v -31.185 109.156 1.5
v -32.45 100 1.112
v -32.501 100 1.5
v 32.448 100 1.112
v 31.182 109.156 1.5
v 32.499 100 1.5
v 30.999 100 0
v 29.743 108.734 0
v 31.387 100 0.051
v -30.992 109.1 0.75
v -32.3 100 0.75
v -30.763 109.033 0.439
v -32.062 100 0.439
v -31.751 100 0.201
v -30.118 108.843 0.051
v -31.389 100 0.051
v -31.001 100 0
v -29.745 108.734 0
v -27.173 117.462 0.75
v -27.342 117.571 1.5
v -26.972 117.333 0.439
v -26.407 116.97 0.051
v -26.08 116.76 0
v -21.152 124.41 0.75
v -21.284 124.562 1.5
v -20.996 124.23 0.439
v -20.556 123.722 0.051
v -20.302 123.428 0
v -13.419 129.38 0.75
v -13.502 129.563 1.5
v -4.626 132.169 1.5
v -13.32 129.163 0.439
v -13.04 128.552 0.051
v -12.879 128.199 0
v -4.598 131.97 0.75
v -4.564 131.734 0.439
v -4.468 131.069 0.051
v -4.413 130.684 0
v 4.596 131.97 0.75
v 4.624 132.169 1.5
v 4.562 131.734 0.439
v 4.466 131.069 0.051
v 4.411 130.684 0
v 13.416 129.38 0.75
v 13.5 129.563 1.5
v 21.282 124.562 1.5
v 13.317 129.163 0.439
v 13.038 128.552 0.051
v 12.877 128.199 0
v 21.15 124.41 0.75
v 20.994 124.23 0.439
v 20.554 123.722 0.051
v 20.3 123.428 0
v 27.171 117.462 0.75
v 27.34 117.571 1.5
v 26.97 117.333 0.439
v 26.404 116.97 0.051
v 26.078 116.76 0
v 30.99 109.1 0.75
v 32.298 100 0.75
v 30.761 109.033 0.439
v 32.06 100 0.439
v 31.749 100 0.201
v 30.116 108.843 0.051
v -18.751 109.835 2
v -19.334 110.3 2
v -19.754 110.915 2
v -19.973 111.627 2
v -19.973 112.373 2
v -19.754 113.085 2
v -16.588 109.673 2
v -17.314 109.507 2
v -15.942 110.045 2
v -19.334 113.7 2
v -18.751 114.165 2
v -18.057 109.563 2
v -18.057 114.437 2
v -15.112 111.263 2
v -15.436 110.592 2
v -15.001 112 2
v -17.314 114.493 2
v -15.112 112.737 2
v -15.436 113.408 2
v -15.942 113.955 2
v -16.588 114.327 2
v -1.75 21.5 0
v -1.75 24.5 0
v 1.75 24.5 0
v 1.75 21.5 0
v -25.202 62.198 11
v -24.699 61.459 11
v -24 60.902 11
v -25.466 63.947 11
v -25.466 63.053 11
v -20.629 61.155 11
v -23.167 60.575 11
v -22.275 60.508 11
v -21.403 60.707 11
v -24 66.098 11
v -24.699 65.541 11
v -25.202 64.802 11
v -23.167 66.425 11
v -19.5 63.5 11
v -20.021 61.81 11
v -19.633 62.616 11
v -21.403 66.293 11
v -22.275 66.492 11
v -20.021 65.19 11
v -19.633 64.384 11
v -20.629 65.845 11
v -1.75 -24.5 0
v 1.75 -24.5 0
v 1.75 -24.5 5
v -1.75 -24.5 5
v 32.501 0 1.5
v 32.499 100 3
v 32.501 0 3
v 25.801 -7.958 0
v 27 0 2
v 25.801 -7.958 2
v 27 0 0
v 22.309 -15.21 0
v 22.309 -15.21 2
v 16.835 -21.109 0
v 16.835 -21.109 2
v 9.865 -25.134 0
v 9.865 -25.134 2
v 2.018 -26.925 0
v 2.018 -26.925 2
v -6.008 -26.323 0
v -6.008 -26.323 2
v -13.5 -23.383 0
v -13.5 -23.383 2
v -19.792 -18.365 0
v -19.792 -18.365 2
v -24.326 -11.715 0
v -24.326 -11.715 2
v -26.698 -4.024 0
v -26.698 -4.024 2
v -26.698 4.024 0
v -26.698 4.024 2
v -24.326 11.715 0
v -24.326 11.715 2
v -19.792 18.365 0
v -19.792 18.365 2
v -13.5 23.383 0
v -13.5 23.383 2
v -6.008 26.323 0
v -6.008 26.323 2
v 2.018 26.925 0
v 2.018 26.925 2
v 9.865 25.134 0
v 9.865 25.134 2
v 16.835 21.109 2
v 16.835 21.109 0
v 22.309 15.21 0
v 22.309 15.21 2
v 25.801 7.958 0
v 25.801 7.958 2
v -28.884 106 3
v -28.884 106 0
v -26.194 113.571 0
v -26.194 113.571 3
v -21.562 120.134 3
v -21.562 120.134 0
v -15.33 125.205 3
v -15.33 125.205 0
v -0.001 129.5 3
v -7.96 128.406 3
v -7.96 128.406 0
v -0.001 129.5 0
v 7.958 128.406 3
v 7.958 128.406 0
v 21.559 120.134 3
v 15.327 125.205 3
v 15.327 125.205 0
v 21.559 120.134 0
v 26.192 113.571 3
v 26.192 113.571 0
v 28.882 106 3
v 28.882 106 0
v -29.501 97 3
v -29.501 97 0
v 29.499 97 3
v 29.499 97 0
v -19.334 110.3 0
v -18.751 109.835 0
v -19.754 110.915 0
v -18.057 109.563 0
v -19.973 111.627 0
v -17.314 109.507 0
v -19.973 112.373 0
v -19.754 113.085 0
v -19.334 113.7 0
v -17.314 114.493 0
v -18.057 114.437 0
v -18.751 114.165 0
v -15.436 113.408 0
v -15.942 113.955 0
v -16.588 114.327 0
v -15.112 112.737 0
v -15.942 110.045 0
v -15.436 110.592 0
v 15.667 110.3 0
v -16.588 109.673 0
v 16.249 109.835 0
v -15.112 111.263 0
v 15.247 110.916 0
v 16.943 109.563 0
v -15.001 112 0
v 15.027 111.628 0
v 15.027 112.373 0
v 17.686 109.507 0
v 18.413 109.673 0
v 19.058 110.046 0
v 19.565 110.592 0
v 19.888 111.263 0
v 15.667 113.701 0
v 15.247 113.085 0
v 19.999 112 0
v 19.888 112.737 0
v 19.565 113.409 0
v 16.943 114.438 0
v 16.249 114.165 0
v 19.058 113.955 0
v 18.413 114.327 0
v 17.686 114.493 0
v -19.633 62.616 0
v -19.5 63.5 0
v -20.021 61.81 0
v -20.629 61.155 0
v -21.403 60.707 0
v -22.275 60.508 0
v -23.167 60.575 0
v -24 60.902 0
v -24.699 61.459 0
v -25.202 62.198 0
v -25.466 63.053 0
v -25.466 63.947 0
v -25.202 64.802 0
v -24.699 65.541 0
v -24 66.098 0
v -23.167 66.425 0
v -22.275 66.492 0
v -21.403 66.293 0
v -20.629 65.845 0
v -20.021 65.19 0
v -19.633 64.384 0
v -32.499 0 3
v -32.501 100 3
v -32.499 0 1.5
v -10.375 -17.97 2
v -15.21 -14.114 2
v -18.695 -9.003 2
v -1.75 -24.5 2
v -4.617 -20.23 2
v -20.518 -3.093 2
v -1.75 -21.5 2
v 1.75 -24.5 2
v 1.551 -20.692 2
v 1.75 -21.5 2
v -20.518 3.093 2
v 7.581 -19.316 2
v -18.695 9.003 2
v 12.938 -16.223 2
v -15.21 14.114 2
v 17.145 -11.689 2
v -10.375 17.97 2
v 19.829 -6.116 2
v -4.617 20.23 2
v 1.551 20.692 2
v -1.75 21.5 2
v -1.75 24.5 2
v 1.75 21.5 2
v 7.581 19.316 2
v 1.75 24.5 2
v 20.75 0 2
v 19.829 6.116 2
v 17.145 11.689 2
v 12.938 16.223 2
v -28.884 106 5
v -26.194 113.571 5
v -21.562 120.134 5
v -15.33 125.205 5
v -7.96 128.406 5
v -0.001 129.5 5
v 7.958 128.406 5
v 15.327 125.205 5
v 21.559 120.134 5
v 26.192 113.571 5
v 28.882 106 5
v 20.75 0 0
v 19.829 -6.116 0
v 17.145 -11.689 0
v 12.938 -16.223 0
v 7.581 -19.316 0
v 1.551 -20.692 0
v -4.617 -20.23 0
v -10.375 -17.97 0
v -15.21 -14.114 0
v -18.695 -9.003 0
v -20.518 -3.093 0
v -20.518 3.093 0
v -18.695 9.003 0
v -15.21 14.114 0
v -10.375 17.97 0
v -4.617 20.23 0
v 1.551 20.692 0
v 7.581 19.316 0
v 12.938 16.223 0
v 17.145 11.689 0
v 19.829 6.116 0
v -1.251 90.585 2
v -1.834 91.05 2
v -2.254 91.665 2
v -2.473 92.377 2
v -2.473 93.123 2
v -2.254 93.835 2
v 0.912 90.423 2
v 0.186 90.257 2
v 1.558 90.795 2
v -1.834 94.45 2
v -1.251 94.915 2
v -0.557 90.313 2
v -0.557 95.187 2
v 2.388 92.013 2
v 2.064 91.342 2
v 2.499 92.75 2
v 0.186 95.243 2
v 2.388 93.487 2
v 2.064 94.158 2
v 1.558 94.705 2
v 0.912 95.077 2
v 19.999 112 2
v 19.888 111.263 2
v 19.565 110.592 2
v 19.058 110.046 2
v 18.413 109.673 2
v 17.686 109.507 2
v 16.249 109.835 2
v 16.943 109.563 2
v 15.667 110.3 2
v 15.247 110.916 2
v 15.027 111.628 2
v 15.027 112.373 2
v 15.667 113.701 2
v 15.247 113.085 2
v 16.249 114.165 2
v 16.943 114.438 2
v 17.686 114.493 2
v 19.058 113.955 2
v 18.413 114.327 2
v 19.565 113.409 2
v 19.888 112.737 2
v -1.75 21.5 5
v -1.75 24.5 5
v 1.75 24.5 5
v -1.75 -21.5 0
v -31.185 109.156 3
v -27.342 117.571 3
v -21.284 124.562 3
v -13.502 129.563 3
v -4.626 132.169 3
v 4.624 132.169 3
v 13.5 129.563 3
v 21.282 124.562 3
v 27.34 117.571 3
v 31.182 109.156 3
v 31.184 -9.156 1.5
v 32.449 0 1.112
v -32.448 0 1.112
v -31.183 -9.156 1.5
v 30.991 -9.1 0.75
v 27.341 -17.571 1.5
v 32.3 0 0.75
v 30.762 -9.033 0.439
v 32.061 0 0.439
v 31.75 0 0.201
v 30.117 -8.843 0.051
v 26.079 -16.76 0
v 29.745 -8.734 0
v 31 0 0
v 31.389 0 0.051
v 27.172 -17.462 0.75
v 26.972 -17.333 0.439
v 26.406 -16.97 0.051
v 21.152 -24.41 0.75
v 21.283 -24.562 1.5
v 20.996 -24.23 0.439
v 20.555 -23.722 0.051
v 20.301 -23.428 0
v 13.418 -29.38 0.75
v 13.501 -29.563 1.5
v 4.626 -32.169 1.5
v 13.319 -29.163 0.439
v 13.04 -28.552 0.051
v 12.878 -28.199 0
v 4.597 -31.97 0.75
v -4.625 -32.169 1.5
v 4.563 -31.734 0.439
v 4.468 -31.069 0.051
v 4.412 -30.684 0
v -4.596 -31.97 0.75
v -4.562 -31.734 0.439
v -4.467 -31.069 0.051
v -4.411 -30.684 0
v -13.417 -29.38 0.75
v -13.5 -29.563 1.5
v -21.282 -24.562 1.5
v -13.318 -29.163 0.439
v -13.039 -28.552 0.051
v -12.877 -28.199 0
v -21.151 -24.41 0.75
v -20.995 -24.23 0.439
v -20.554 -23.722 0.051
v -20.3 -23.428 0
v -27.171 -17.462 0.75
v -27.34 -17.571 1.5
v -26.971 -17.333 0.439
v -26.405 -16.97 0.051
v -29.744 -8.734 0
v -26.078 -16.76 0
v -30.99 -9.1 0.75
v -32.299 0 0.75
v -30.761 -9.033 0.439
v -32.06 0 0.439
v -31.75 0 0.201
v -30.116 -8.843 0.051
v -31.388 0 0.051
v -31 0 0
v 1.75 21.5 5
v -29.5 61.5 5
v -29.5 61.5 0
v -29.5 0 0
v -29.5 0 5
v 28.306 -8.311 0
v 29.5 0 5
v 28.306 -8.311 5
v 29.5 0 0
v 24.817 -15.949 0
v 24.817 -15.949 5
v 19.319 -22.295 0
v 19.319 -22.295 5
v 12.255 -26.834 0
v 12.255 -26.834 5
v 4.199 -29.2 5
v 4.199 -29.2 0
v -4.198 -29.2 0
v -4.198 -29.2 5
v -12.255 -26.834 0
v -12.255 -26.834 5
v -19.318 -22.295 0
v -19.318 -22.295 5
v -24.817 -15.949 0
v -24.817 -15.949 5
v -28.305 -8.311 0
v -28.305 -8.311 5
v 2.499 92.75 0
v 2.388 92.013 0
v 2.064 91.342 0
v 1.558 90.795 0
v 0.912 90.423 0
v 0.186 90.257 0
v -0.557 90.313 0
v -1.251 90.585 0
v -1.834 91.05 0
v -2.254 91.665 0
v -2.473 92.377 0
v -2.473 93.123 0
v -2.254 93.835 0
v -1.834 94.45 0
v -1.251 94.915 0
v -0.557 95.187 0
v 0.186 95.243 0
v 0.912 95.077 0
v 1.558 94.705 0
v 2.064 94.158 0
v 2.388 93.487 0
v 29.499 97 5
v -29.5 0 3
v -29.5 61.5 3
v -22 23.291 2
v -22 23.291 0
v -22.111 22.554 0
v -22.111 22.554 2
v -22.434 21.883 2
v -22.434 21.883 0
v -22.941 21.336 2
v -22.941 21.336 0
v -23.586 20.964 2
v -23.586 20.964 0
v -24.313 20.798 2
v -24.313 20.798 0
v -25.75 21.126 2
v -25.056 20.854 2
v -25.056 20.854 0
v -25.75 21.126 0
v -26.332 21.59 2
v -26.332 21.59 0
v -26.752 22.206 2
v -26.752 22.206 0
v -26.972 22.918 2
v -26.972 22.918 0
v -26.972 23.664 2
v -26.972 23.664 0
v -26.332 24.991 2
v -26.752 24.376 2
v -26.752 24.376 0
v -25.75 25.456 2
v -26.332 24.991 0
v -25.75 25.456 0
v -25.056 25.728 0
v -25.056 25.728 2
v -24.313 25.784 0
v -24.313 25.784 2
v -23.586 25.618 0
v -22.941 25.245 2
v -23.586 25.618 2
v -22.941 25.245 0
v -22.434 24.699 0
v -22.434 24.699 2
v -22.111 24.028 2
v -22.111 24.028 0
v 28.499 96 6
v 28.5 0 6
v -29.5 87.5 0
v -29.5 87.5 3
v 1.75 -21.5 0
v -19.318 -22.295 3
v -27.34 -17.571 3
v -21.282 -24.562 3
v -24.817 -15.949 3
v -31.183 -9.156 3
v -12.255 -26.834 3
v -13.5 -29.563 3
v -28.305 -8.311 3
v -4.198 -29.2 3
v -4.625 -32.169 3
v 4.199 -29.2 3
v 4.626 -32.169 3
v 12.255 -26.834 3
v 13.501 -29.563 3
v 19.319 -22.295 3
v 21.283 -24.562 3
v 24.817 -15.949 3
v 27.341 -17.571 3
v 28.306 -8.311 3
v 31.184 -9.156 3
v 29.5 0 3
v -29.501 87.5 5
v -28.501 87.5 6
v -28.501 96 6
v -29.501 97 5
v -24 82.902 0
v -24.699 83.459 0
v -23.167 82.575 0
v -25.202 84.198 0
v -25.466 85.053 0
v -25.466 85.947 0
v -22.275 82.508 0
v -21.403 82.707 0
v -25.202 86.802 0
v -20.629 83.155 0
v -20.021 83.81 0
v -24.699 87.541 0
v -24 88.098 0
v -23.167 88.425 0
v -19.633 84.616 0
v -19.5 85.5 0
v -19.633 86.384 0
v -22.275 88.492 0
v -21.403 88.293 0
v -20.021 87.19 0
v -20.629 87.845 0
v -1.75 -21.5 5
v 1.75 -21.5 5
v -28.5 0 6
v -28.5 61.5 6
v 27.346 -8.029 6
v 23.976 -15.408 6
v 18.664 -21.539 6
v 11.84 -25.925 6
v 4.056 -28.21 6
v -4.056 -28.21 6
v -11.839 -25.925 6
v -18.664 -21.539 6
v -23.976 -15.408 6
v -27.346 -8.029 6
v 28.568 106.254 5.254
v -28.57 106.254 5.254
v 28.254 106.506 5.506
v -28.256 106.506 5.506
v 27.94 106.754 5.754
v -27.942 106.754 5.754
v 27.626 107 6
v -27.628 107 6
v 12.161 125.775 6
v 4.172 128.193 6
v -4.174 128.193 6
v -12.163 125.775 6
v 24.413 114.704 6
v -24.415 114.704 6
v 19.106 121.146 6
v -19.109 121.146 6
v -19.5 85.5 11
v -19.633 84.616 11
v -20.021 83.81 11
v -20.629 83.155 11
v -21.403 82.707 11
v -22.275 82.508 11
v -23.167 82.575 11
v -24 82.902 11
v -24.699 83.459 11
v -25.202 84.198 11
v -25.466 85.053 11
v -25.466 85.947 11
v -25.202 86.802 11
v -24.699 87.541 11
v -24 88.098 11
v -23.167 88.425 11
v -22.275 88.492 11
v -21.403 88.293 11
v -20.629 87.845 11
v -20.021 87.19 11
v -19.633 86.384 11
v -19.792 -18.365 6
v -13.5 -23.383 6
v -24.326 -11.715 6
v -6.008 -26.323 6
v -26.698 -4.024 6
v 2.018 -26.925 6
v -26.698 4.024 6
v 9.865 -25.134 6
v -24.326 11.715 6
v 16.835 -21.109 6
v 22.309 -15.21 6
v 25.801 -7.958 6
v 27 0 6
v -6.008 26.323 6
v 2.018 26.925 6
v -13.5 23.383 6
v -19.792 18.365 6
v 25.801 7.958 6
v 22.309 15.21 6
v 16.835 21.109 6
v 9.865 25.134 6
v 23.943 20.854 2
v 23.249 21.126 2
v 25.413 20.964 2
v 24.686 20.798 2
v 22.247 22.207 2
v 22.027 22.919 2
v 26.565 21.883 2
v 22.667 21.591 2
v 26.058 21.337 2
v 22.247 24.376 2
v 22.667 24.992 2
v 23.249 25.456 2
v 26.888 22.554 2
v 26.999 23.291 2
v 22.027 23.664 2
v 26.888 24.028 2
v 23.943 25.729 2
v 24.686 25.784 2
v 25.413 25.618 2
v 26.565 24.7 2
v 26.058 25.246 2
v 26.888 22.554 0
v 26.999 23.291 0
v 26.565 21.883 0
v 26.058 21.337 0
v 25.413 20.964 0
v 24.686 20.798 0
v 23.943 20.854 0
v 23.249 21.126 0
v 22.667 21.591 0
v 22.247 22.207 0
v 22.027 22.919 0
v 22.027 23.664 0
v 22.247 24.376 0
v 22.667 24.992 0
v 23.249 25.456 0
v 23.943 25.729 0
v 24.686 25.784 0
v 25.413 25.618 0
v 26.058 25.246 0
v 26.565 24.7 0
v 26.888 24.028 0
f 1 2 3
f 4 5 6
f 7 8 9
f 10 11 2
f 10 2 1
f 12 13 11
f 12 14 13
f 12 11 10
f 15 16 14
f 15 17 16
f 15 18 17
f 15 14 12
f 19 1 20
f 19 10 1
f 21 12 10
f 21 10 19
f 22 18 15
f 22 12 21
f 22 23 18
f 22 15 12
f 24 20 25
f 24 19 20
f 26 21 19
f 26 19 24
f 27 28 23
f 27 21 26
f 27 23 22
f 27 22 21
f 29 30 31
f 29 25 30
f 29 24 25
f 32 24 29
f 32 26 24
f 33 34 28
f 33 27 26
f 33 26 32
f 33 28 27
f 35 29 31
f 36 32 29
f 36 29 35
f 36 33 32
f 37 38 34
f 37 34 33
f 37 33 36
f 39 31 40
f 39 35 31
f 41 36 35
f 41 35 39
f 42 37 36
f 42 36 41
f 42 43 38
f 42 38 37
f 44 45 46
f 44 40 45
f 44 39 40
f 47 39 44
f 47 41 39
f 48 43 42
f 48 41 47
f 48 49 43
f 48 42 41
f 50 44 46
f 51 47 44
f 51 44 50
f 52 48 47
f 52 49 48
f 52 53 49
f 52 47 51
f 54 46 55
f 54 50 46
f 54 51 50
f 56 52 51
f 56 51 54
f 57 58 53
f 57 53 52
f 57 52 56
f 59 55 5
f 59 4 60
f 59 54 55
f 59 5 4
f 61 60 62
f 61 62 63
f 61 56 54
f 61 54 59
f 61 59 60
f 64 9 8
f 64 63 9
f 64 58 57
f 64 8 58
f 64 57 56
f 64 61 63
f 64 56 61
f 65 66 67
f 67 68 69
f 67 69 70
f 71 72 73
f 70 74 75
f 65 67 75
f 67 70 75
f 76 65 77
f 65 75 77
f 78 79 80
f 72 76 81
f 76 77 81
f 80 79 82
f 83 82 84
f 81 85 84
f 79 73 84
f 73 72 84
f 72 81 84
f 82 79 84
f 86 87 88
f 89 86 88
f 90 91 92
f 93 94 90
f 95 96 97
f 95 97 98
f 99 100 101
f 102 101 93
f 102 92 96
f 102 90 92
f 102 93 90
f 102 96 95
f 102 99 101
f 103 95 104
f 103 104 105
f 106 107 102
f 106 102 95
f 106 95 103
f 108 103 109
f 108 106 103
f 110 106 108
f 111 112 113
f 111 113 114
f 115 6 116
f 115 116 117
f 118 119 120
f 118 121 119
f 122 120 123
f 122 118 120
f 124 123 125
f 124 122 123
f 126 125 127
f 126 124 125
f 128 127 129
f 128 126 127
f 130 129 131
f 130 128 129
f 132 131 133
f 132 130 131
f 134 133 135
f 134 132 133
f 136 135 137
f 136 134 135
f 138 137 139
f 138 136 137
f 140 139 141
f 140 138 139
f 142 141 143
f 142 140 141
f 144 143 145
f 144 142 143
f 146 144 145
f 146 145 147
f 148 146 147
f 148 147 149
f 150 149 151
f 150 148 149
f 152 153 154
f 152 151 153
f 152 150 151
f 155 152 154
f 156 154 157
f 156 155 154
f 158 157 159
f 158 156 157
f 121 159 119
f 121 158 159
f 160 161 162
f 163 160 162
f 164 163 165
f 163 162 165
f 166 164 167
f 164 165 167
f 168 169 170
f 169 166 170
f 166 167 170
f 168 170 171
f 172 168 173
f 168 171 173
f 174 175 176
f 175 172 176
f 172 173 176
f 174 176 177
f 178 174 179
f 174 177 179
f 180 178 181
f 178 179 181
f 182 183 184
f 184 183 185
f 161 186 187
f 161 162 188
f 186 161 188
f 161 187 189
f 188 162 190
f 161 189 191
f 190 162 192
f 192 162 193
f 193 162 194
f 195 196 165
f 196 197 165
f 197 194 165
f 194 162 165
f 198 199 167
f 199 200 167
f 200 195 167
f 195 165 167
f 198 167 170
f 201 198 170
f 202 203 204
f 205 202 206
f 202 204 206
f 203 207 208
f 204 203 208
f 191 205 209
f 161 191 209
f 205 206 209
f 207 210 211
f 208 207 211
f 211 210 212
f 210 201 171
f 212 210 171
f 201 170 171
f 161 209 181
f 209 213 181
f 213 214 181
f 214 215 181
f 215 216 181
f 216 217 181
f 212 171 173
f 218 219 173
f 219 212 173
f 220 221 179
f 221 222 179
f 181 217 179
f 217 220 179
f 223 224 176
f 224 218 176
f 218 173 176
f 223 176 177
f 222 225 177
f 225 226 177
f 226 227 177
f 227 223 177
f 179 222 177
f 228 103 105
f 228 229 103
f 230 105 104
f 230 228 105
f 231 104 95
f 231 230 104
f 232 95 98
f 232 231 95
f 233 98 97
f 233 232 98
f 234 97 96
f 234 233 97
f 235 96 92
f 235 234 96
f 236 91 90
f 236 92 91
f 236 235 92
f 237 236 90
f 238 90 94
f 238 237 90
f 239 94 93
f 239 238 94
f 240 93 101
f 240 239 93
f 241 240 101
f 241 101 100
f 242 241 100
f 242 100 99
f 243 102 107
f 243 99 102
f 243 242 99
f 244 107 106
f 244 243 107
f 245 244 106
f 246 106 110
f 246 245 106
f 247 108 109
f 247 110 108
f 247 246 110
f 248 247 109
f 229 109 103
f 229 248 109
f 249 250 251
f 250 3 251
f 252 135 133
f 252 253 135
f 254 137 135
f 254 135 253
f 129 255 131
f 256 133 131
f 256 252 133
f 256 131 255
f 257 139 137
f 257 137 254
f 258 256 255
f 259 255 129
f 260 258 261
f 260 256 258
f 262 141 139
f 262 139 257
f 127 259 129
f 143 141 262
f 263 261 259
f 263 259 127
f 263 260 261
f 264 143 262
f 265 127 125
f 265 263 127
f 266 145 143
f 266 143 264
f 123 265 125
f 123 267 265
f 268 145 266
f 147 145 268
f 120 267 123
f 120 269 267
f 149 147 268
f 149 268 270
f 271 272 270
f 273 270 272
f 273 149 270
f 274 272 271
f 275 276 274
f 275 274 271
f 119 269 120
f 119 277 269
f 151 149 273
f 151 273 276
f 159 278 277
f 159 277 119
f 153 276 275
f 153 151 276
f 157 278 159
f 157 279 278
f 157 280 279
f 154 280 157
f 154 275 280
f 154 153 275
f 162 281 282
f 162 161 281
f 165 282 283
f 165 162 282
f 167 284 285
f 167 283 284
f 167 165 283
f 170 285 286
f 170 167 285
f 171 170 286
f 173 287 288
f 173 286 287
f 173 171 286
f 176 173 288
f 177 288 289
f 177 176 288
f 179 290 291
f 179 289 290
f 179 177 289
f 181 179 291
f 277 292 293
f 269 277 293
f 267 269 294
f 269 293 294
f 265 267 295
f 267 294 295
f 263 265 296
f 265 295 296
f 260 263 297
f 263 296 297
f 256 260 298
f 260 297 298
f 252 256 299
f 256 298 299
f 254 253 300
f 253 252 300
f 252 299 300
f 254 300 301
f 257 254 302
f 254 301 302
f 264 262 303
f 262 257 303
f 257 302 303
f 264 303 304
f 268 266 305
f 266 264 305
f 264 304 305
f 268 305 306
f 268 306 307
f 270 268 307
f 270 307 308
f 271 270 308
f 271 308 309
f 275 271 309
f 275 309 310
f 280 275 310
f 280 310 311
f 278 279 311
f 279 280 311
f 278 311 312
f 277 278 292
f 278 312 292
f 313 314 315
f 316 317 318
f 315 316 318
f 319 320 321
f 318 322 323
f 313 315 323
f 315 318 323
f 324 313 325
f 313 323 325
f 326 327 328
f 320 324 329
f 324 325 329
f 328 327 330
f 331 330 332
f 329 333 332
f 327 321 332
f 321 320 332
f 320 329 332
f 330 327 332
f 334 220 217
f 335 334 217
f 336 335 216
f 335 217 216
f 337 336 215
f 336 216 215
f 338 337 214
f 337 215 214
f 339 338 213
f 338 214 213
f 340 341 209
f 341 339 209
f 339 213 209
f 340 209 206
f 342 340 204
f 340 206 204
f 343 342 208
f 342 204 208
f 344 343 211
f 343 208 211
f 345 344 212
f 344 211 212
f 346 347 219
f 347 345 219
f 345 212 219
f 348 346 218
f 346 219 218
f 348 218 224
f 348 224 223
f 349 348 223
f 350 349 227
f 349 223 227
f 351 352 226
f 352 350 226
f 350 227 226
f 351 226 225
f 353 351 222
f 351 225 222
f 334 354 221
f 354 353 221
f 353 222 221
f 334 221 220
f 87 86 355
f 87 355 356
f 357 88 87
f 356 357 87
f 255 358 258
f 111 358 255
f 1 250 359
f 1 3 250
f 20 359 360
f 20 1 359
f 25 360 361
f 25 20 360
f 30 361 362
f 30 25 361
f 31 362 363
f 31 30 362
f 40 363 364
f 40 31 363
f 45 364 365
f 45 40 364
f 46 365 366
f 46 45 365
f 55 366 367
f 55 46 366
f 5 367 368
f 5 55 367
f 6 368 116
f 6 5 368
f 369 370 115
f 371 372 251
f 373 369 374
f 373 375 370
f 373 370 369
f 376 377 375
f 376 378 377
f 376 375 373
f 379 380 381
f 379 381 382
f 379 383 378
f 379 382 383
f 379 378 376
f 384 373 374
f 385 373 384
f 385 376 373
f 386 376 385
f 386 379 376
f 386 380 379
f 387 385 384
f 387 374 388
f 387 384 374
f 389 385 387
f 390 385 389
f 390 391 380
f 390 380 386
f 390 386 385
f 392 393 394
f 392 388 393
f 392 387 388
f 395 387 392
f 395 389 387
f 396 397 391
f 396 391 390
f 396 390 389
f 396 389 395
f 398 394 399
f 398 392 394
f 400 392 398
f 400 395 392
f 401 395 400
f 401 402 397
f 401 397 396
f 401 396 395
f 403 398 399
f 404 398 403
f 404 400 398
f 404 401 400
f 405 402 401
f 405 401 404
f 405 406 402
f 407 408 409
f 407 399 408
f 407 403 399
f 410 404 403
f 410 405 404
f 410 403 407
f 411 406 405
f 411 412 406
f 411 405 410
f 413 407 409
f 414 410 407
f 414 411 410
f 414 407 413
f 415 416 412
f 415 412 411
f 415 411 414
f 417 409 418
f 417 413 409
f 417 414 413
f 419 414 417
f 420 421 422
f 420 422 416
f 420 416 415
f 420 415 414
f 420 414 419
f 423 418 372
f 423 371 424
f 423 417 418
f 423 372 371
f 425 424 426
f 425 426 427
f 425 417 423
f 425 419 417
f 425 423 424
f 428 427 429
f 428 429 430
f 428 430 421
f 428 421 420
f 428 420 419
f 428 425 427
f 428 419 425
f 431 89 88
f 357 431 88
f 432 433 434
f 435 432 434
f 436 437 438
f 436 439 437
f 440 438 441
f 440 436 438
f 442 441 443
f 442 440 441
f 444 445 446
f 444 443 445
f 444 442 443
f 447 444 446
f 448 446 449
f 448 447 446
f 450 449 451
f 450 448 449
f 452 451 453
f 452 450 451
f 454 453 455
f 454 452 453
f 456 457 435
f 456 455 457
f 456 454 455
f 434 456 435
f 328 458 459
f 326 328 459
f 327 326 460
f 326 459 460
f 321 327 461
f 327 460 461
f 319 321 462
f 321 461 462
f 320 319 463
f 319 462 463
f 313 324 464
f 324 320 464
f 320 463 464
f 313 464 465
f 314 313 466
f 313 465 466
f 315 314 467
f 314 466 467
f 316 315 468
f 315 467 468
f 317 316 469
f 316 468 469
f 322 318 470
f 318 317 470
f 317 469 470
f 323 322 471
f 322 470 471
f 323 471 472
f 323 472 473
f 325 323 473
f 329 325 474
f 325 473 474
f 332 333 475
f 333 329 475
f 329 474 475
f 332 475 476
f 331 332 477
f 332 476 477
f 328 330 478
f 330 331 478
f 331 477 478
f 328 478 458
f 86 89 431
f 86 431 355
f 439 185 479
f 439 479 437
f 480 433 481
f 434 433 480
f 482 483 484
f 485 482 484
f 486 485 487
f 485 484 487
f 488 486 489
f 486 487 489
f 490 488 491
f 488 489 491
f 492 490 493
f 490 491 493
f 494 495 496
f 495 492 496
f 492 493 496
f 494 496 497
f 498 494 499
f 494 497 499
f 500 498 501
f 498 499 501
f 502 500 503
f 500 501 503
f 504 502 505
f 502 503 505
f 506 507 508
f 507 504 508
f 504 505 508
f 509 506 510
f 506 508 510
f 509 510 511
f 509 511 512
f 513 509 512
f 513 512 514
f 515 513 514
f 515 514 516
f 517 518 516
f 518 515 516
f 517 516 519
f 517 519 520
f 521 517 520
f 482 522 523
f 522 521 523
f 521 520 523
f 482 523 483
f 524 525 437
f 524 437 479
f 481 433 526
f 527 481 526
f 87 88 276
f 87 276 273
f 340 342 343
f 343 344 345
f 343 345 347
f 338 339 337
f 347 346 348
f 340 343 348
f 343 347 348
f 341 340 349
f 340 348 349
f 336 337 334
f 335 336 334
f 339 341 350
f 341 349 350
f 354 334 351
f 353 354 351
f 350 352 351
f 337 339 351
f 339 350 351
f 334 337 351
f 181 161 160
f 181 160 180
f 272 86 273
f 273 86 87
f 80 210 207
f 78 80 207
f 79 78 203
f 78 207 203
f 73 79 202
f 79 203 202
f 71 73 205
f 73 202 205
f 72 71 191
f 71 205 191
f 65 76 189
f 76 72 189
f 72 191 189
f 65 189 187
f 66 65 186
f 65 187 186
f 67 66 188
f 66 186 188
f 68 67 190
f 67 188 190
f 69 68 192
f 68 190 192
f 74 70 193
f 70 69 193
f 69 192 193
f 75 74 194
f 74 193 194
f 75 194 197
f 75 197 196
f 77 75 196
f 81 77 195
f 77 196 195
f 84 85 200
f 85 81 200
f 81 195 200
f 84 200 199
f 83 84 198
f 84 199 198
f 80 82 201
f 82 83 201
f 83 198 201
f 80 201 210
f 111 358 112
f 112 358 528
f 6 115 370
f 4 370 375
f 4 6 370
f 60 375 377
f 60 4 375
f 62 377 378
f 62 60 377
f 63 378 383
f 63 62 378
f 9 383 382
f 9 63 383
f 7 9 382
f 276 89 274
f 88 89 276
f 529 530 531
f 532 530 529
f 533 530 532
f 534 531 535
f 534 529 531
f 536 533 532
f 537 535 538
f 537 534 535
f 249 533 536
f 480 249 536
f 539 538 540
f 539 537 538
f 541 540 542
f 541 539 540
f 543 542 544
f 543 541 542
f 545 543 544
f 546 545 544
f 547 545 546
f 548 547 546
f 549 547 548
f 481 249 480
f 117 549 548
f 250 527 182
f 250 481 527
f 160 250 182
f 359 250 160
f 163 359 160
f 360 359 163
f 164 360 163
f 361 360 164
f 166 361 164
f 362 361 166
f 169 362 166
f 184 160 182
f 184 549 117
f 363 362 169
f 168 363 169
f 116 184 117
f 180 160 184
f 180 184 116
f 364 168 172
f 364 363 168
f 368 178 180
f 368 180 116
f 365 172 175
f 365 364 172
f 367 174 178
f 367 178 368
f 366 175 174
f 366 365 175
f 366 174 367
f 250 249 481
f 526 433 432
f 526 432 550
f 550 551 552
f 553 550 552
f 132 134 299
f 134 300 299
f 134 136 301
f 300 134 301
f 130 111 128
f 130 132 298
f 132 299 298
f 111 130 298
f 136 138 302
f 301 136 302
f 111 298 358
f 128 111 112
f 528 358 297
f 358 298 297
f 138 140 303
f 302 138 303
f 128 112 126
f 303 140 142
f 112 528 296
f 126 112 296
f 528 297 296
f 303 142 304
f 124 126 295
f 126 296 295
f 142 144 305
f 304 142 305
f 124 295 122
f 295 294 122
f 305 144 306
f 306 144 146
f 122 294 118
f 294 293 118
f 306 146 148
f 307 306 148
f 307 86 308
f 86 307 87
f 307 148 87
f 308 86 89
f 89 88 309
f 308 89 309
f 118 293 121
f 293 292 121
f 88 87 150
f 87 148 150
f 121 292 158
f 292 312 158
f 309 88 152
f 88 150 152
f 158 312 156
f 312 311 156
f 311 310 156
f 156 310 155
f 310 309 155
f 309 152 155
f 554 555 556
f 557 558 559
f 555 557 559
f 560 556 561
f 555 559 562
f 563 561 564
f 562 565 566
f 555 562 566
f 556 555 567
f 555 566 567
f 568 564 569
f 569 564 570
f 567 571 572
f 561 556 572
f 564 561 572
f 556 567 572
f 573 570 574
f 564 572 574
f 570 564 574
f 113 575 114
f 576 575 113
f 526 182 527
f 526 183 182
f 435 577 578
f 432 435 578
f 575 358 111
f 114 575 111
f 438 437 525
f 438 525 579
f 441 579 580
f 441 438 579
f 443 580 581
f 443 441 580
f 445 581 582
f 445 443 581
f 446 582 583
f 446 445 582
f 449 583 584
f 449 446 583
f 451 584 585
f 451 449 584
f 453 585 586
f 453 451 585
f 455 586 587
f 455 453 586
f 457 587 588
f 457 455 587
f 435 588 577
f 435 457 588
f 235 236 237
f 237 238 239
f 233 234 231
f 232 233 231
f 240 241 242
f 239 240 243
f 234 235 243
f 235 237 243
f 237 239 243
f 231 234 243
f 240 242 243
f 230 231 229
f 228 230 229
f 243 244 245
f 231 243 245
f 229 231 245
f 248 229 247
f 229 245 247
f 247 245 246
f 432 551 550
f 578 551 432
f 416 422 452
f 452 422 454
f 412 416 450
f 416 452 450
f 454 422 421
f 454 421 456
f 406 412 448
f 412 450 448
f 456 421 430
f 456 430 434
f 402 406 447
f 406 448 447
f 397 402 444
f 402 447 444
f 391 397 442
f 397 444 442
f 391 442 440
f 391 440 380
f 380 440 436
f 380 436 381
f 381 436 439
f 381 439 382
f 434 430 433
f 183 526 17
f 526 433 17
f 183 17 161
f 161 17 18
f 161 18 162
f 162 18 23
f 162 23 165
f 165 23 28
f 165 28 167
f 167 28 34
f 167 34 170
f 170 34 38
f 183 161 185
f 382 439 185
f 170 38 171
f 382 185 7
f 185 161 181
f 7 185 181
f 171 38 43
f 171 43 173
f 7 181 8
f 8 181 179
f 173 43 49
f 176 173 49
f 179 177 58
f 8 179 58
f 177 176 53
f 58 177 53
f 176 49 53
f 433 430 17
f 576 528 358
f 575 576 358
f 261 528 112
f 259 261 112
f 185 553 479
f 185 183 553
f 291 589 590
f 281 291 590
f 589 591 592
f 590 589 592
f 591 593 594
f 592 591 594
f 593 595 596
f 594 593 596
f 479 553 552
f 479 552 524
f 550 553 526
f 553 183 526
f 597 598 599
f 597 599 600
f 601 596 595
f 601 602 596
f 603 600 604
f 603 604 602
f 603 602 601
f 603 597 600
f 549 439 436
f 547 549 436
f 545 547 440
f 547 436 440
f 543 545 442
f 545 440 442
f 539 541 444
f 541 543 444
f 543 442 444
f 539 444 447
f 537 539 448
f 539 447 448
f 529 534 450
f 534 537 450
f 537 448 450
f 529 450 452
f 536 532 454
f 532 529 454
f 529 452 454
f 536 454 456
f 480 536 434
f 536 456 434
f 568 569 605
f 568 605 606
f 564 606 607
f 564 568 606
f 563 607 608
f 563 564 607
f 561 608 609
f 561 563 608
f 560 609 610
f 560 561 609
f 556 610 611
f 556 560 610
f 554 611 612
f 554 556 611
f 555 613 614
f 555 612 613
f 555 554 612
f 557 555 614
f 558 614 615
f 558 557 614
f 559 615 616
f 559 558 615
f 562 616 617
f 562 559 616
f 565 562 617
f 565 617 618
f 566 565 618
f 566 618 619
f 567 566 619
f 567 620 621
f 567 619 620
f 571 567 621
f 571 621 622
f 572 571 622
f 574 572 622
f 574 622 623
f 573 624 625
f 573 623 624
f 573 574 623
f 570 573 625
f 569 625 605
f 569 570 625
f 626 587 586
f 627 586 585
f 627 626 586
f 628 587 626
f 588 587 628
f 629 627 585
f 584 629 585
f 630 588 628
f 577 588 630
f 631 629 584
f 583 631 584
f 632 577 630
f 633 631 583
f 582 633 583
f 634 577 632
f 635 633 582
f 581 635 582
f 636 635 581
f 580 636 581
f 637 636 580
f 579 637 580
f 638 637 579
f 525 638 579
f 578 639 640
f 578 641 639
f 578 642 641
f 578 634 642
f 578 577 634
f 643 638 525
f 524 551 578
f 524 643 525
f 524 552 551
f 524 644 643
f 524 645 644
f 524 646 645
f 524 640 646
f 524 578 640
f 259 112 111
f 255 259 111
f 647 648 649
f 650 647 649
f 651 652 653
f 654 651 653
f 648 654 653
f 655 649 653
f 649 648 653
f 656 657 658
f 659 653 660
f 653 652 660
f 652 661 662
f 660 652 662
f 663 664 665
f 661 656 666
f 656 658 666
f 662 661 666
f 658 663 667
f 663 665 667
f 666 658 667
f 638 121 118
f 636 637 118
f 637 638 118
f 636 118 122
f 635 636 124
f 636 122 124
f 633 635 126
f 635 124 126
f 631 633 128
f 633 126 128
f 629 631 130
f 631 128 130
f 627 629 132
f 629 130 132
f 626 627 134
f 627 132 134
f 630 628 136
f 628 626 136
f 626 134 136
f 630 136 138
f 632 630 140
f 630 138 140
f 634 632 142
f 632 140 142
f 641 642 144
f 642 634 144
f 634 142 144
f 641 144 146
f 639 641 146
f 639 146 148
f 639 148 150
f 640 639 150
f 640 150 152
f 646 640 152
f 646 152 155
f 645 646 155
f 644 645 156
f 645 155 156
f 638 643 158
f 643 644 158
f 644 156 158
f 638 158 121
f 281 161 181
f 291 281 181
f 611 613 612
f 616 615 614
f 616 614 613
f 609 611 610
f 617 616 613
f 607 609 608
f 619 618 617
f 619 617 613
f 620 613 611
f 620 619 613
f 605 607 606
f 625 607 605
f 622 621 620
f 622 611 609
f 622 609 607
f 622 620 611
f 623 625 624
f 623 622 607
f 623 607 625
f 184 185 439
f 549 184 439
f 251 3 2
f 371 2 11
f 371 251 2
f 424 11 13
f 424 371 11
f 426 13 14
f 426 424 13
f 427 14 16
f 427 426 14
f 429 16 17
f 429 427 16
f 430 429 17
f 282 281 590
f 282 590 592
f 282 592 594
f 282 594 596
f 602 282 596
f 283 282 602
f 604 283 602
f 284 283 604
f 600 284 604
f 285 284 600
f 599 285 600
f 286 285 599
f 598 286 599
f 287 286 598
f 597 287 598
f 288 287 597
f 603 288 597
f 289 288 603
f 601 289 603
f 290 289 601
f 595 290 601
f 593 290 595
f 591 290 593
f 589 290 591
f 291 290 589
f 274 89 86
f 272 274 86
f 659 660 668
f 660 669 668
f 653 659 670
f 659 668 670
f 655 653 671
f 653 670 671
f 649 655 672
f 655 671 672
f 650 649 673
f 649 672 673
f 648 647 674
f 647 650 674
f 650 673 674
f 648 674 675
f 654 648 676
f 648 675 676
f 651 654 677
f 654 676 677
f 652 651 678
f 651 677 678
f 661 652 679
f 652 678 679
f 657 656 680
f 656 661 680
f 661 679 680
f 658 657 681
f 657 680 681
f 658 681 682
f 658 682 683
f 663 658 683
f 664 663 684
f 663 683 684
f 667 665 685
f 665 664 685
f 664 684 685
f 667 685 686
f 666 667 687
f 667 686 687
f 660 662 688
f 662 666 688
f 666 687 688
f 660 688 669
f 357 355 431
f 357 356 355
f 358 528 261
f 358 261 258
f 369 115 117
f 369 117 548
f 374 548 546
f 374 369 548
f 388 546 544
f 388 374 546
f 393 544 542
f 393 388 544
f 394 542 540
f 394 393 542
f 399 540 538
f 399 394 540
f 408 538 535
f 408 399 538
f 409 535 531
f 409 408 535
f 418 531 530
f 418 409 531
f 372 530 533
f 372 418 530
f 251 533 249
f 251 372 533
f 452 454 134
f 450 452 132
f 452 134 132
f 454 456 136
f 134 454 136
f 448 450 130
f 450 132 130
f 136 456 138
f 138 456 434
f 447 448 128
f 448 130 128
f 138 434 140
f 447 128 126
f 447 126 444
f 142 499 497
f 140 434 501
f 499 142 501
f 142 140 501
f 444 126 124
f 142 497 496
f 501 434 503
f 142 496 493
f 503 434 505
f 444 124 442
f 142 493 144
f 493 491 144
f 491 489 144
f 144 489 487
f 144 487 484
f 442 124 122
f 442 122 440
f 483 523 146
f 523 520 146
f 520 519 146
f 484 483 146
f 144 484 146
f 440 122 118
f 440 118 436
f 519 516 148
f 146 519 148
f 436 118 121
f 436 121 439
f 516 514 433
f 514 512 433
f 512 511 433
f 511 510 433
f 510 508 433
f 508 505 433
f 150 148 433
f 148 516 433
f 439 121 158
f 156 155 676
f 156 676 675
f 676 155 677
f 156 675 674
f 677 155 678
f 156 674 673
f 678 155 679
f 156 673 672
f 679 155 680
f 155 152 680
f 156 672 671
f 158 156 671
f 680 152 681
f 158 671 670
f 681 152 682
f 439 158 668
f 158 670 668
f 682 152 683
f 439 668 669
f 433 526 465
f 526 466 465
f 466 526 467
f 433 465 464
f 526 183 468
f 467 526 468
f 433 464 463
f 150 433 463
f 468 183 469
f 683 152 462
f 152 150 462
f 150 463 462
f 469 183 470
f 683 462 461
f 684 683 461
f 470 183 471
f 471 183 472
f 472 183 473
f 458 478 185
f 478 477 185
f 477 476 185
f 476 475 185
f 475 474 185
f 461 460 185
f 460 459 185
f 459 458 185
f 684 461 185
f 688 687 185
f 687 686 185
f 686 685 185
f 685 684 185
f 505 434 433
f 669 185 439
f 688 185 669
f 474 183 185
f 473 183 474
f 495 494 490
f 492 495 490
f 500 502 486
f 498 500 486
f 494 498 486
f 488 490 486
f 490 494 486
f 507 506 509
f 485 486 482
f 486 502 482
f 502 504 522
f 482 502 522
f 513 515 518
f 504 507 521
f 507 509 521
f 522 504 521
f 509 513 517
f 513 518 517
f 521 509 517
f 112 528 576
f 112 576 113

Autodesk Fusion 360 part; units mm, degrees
sketch "Sketch1" plane through (0, 0, 0) normal (0, 0, 1) x (1, 0, 0)
  circle A0 centre (0.0005, 0) radius 20.75
  arc A1 (32.4989, 100) -> (-32.5011, 100) centre (-0.0011, 100) ccw
  circle A2 centre (0.0005, 0) radius 27
  line L0 (-49, 0) -> (63, 0) construction
  line L1 (-32.5011, 100) -> (-32.4995, 0)
  line L2 (32.4989, 100) -> (32.5005, 0)
  arc A3 (-32.4995, 0) -> (32.5005, 0.0005) centre (0.0005, 0) ccw
  arc A4 (-29.5001, 0) -> (29.5005, 0) centre (0.0002, 0) ccw
  line L3 (-29.4995, 61.5) -> (-29.4995, 87.5)
  line L4 (-29.5011, 97) -> (29.4989, 97)
  line L5 (-28.8845, 106) -> (28.8823, 106)
  arc A5 (28.8823, 106) -> (-28.8845, 106) centre (-0.0011, 100) ccw
  line L6 (29.4989, 100.0007) -> (29.4989, 100)
  line L7 (29.4989, 97) -> (29.5005, 0)
  line L8 (-29.5011, 97) -> (-29.5001, 0)
  line L9 (-24.4995, 23.2909) -> (-38.4097, 23.2907) construction
  line L10 (-29.5011, 97) -> (-29.5001, 0)
  line L11 (-26.4995, 112) -> (22.6043, 112) construction
  line L12 (0.0002, 0) -> (0.0007, -38) construction
  line L13 (-1.7495, 21.5) -> (-1.7496, 24.5)
  line L14 (1.7505, 21.5) -> (1.7504, 24.5)
  line L15 (1.7505, 21.5) -> (-1.7495, 21.5)
  line L16 (1.7504, 24.5) -> (-1.7496, 24.5)
  circle A6 centre (17.4994, 112.0003) radius 2.5
  circle A7 centre (-17.5011, 112) radius 2.5
  circle A8 centre (24.4992, 23.2913) radius 2.5
  circle A9 centre (-24.4995, 23.2909) radius 2.5
  line L17 (1.7504, -24.5) -> (-1.7496, -24.5)
  line L18 (-1.7495, -21.5) -> (-1.7496, -24.5)
  line L19 (1.7505, -21.5) -> (-1.7495, -21.5)
  line L20 (1.7505, -21.5) -> (1.7504, -24.5)
  line L21 (-24.9995, 61) -> (3.0005, 61) construction
  line L22 (3.0005, 61) -> (3.0005, 88) construction
  line L23 (3.0005, 88) -> (-24.9995, 88) construction
  line L24 (-24.9995, 88) -> (-24.9995, 61) construction
  circle A10 centre (-22.4995, 63.5) radius 3
  line L25 (-24.9995, 74.5) -> (3.0005, 74.5) construction
  circle A11 centre (-22.4995, 85.5) radius 3
  circle A12 centre (-0.0011, 92.75) radius 2.5
  dimension "d2" = 41.5
  dimension "d3" = 65
  dimension "d76" = 54
  dimension "d88" = 65
  dimension "d91" = 100
  dimension "d107" = 3
  dimension "d118" = 26
  dimension "d144" = 5
  dimension "d145" = 8
  dimension "d148" = 5
  dimension "d149" = 4.25
  dimension "d150" = 32.5
  dimension "d151" = 5
  dimension "d152" = 15
  dimension "d153" = 12
  dimension "d235" = 21.5
  dimension "d236" = 3
  dimension "d237" = 27
  dimension "d238" = 28
  dimension "d239" = 6
  dimension "d243" = 2.5
  dimension "d244" = 2.5
  dimension "d245" = 61
  dimension "d246" = 25
extrude "Extrude30" add sketch "Sketch1" along normal blind 3 contours A1 L1 L2 A3 makes body 1
extrude "Extrude32" add sketch "Sketch1" along normal blind 5 separate body contours L13 L14 L15 L16 | L17 L18 L19 L20 makes body 2 at (-0.5829, 21.5, 3.3333) makes body 3 at (0.5838, -21.5, 1.6667)
extrude "Extrude33" add sketch "Sketch1" along normal blind 2 separate body contours A2 makes body 4
extrude "Extrude34" add sketch "Sketch1" along normal blind 6 separate body contours A4 L3 L4 L7 L8 L10 | L5 A5 | A6 | A7 | A8 | A9 | A10 | A11 | A12 makes body 5 at (-1.0934, 115.1669, 0) makes body 6 at (-0.6731, 73.6415, 0)
chamfer "Chamfer1" distance 1 angle 45 4 edges at (-29.5006, 48.5, 6) (0.0002, -29.5003, 6) (29.4997, 48.5, 6) (-0.0011, 97, 6) on bodies 6
chamfer "Chamfer2" distance 1 angle 45 2 edges at (-0.0011, 129.5, 6) (-0.0011, 106, 6) on bodies 5
fillet "Fillet1" radius 1.5 4 edges at (0.0007, -32.5, 0) (-32.5003, 50, 0) (-0.0011, 132.5, 0) (32.4997, 50.0003, 0) on bodies 1
extrude "Extrude35" cut sketch "Sketch1" along normal blind 2 contours A6 | A7 bodies 5
extrude "Extrude36" cut sketch "Sketch1" along normal blind 2 contours A8 | A9 bodies 6
extrude "Extrude37" cut sketch "Sketch1" along normal blind 2 contours A12 bodies 6
extrude "Extrude38" add sketch "Sketch1" along normal blind 11 separate body contours A10 | A11 makes body 7 at (-19.8649, 64.9348, 3.6667) makes body 8 at (-19.6805, 84.4739, 7.3333)
extrude "Extrude6" [suppressed]
extrude "Extrude7" [suppressed]
sketch "Sketch3" plane through (-30, 0, 0) normal (-1, 0, 0) x (0, -1, 0)
  line L0 (-60, 0) -> (0, 0)
  line L1 (0, 0) -> (0, 36)
  line L2 (0, 36) -> (-60, 36)
  line L3 (-60, 36) -> (-60, 0)
  line L4 (-52, 8) -> (-52, 28)
  line L5 (-55, 28) -> (-55, 8)
  arc A0 (-52, 28) -> (-55, 28) centre (-53.5, 28) ccw
  arc A1 (-55, 8) -> (-52, 8) centre (-53.5, 8) ccw
  arc A2 (-46.125, 28) -> (-49.125, 28) centre (-47.625, 28) ccw
  line L6 (-46.125, 8) -> (-46.125, 28)
  line L7 (-49.125, 28) -> (-49.125, 8)
  arc A3 (-49.125, 8) -> (-46.125, 8) centre (-47.625, 8) ccw
  arc A4 (-40.25, 28) -> (-43.25, 28) centre (-41.75, 28) ccw
  line L8 (-40.25, 8) -> (-40.25, 28)
  line L9 (-43.25, 28) -> (-43.25, 8)
  arc A5 (-43.25, 8) -> (-40.25, 8) centre (-41.75, 8) ccw
  arc A6 (-34.375, 28) -> (-37.375, 28) centre (-35.875, 28) ccw
  line L10 (-34.375, 8) -> (-34.375, 28)
  line L11 (-37.375, 28) -> (-37.375, 8)
  arc A7 (-37.375, 8) -> (-34.375, 8) centre (-35.875, 8) ccw
  arc A8 (-28.5, 28) -> (-31.5, 28) centre (-30, 28) ccw
  line L12 (-28.5, 8) -> (-28.5, 28)
  line L13 (-31.5, 28) -> (-31.5, 8)
  arc A9 (-31.5, 8) -> (-28.5, 8) centre (-30, 8) ccw
  arc A10 (-22.625, 28) -> (-25.625, 28) centre (-24.125, 28) ccw
  line L14 (-22.625, 8) -> (-22.625, 28)
  line L15 (-25.625, 28) -> (-25.625, 8)
  arc A11 (-25.625, 8) -> (-22.625, 8) centre (-24.125, 8) ccw
  arc A12 (-16.75, 28) -> (-19.75, 28) centre (-18.25, 28) ccw
  line L16 (-16.75, 8) -> (-16.75, 28)
  line L17 (-19.75, 28) -> (-19.75, 8)
  arc A13 (-19.75, 8) -> (-16.75, 8) centre (-18.25, 8) ccw
  arc A14 (-10.875, 28) -> (-13.875, 28) centre (-12.375, 28) ccw
  line L18 (-10.875, 8) -> (-10.875, 28)
  line L19 (-13.875, 28) -> (-13.875, 8)
  arc A15 (-13.875, 8) -> (-10.875, 8) centre (-12.375, 8) ccw
  arc A16 (-5, 28) -> (-8, 28) centre (-6.5, 28) ccw
  line L20 (-5, 8) -> (-5, 28)
  line L21 (-8, 28) -> (-8, 8)
  arc A17 (-8, 8) -> (-5, 8) centre (-6.5, 8) ccw
  line L22 (-60, 18) -> (-55, 18)
  dimension "d42" = 3
  dimension "d43" = 20
  dimension "d44" = 3
  dimension "d45" = 3
  dimension "d46" = 10
  dimension "d47" = 5
  dimension "d50" = 47
  dimension "d51" = 0
extrude "Extrude8" [suppressed]
extrude "Extrude9" [suppressed]
